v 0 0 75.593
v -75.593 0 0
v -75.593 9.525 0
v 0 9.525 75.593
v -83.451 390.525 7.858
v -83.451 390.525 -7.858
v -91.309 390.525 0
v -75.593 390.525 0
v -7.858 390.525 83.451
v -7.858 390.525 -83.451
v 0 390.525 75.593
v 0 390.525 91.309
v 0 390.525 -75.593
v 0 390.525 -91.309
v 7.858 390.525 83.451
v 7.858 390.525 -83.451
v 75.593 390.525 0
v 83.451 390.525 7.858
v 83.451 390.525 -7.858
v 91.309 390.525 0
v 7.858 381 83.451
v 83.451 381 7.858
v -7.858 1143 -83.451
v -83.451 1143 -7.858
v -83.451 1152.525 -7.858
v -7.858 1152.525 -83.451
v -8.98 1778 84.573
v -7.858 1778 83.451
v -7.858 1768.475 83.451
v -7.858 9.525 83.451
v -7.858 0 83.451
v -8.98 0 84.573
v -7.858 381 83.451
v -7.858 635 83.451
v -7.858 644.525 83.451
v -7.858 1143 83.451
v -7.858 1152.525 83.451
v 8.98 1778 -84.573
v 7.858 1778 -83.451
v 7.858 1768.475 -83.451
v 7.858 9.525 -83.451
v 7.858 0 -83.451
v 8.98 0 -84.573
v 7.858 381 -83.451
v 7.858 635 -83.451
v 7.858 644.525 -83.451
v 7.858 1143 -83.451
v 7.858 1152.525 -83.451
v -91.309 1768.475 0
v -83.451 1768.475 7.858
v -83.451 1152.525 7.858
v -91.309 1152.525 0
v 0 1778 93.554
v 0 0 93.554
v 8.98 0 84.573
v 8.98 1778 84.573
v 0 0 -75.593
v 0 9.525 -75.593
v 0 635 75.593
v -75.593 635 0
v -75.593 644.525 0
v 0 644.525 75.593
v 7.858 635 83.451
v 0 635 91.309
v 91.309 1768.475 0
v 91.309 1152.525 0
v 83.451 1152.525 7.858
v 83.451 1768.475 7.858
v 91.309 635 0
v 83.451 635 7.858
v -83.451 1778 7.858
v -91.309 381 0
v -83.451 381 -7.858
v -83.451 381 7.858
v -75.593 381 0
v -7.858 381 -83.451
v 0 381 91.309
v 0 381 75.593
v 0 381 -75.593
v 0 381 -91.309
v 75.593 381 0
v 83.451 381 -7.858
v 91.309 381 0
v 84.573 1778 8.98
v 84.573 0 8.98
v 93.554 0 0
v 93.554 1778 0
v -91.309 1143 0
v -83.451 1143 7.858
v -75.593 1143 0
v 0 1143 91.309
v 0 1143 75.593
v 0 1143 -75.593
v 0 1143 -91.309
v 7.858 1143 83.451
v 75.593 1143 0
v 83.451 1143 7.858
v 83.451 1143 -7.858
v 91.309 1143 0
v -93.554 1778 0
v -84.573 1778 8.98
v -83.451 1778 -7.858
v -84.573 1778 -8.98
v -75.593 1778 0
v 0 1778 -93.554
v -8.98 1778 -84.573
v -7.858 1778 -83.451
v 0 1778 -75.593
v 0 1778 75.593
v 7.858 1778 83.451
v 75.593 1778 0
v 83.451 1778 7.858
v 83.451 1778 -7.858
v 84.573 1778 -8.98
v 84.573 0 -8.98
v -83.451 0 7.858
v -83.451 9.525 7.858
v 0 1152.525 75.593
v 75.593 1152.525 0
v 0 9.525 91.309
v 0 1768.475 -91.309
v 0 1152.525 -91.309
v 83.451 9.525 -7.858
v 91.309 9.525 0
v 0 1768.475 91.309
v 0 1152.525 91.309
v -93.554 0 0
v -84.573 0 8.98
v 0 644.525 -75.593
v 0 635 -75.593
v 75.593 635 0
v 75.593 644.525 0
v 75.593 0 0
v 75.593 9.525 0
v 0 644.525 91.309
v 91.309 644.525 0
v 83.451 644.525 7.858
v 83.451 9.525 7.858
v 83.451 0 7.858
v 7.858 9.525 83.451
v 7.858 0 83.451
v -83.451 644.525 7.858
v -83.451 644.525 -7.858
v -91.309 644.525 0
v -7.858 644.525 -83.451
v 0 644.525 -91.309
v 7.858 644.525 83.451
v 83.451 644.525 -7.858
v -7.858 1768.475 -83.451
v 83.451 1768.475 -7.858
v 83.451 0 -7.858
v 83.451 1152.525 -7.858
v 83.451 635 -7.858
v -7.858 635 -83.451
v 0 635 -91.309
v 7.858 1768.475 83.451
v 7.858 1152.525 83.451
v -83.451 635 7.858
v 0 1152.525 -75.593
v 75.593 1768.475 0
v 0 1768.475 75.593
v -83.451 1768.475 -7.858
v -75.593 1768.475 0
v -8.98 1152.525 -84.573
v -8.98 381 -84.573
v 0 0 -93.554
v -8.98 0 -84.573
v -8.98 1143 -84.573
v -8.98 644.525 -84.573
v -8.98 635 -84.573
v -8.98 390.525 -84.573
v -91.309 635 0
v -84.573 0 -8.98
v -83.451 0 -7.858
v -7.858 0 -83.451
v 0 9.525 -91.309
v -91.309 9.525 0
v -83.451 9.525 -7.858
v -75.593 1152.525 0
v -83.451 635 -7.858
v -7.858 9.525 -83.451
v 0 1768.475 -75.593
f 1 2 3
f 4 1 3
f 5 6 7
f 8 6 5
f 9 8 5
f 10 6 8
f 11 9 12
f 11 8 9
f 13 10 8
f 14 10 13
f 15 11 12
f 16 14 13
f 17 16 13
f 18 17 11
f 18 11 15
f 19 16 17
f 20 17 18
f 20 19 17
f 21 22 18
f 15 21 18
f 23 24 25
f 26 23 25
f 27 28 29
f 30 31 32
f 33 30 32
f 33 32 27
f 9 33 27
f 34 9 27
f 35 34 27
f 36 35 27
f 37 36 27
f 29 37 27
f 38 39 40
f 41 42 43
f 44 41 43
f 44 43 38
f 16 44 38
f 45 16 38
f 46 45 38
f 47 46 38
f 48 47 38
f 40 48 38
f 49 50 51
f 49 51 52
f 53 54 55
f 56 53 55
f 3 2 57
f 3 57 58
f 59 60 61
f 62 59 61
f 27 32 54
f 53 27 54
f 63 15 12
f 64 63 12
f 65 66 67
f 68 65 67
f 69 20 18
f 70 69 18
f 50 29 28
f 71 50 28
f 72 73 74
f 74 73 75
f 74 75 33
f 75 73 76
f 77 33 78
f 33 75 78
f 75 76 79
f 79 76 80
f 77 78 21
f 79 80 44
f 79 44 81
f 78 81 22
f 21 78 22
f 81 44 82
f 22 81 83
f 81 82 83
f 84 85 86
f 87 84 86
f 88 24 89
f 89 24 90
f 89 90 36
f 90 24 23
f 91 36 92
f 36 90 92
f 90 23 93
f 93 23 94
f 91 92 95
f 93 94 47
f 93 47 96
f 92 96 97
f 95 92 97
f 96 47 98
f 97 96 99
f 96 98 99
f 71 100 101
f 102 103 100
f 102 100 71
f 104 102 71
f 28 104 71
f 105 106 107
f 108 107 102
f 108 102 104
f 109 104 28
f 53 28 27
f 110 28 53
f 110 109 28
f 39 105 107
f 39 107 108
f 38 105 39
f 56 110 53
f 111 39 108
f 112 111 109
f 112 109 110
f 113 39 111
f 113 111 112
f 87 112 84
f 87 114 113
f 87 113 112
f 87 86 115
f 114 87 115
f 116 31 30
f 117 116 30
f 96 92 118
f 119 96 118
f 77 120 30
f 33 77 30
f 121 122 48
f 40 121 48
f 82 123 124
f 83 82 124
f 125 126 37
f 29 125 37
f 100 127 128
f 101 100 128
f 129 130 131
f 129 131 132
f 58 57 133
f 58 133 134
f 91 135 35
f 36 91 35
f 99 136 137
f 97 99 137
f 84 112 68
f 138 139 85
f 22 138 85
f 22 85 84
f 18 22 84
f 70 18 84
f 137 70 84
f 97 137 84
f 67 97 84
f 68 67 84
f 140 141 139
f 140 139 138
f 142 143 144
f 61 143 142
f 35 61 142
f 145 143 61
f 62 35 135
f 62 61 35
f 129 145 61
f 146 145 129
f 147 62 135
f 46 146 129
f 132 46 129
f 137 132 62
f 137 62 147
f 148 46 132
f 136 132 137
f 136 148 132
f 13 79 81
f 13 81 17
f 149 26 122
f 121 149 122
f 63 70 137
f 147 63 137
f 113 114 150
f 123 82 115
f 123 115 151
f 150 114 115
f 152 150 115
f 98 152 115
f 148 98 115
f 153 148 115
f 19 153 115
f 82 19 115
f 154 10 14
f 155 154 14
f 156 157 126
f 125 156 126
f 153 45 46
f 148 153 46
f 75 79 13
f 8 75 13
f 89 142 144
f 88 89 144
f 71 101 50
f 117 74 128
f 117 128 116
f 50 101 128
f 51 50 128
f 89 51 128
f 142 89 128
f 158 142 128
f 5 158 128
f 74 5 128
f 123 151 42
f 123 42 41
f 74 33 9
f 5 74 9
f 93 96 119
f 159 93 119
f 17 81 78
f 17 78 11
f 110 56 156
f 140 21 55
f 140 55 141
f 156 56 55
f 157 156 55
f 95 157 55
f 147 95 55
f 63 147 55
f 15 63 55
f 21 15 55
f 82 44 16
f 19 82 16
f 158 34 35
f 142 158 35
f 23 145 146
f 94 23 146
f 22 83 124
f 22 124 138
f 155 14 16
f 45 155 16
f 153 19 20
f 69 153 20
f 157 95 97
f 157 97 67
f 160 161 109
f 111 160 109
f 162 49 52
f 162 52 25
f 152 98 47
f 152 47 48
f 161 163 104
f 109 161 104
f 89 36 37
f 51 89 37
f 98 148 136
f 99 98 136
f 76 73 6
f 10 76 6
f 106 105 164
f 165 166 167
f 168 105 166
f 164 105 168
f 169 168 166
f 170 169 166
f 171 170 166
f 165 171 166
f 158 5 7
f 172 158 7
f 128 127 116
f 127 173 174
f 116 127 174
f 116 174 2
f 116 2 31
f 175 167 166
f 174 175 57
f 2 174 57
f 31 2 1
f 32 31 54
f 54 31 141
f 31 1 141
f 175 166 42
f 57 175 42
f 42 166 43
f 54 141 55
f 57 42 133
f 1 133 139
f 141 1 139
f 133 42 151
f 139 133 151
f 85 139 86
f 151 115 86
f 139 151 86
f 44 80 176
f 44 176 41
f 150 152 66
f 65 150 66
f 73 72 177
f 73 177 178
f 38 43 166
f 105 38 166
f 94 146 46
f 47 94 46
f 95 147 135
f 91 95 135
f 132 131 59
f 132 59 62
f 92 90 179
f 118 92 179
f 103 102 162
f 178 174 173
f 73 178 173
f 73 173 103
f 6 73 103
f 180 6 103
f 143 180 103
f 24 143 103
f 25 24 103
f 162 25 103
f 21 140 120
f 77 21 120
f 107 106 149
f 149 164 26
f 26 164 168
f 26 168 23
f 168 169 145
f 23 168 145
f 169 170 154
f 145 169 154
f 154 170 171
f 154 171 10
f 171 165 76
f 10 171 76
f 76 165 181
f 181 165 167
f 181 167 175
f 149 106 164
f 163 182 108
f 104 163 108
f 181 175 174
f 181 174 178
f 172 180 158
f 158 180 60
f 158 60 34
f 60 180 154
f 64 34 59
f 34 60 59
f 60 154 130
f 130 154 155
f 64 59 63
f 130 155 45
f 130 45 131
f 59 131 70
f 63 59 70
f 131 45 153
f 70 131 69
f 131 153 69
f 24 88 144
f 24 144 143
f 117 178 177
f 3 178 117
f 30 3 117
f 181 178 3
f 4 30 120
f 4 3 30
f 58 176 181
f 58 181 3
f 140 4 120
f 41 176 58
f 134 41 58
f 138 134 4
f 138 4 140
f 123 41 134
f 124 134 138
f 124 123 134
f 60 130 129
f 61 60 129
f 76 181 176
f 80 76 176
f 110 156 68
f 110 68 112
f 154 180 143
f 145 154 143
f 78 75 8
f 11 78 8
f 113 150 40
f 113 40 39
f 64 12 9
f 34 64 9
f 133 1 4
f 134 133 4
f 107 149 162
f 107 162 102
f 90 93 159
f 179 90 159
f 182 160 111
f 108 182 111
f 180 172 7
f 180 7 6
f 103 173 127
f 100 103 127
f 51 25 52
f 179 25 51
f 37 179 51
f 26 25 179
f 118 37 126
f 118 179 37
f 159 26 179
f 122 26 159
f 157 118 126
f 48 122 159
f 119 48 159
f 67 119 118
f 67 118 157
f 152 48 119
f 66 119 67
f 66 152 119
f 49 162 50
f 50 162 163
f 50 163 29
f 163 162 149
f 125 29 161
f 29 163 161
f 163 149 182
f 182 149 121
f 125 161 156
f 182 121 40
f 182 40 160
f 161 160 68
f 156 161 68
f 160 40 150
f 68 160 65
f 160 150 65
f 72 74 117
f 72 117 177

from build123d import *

# Parameters (mm, degrees)
BOSS_EXTRUDE6_DEPTH   = 1778
BOSS_EXTRUDE6_2_DEPTH = 1778
BOSS_EXTRUDE6_3_DEPTH = 1778
BOSS_EXTRUDE6_4_DEPTH = 1778
SKETCH11_W            = 11.1125
SKETCH11_H            = 9.525
BOSS_EXTRUDE11_DEPTH  = 129.12986
SKETCH13_W            = 11.1125
SKETCH13_H            = 9.525
BOSS_EXTRUDE13_DEPTH  = 118.01736
SKETCH14_W            = 11.1125
SKETCH14_H            = 9.525
BOSS_EXTRUDE14_DEPTH  = 119.60486
SKETCH15_W            = 11.1125
SKETCH15_H            = 9.525
BOSS_EXTRUDE15_DEPTH  = 106.90486
LPATTERN1_COUNT       = 2
LPATTERN1_PITCH       = 381
LPATTERN2_COUNT       = 2
LPATTERN2_PITCH       = 635
LPATTERN3_COUNT       = 2
LPATTERN3_PITCH       = 1143
LPATTERN4_COUNT       = 2
LPATTERN4_PITCH       = 1768.475


with BuildPart() as part:
    # Sketch2 → Boss-Extrude6 (new body)
    with BuildSketch(Plane(origin=(0, 0, 0), x_dir=(1, 0, 0), z_dir=(0, 1, 0))):
        Polygon((0, 93.553663338), (-8.980256121, 84.573407217), (-7.857724106, 83.450875201), (0, 91.308599307), (7.857724106, 83.450875201), (8.980256121, 84.573407217), align=None)
    extrude(amount=BOSS_EXTRUDE6_DEPTH)



with BuildPart() as body_2:
    # Sketch2 → Boss-Extrude6 2 (new body)
    with BuildSketch(Plane(origin=(0, 0, 0), x_dir=(1, 0, 0), z_dir=(0, 1, 0))):
        Polygon((93.553663338, 0), (84.573407217, 8.980256121), (83.450875201, 7.857724106), (91.308599307, 0), (83.450875201, -7.857724106), (84.573407217, -8.980256121), align=None)
    extrude(amount=BOSS_EXTRUDE6_2_DEPTH)



with BuildPart() as body_3:
    # Sketch2 → Boss-Extrude6 3 (new body)
    with BuildSketch(Plane(origin=(0, 0, 0), x_dir=(1, 0, 0), z_dir=(0, 1, 0))):
        Polygon((0, -93.553663338), (8.980256121, -84.573407217), (7.857724106, -83.450875201), (0, -91.308599307), (-7.857724106, -83.450875201), (-8.980256121, -84.573407217), align=None)
    extrude(amount=BOSS_EXTRUDE6_3_DEPTH)



with BuildPart() as body_4:
    # Sketch2 → Boss-Extrude6 4 (new body)
    with BuildSketch(Plane(origin=(0, 0, 0), x_dir=(1, 0, 0), z_dir=(0, 1, 0))):
        Polygon((-93.553663338, 0), (-84.573407217, -8.980256121), (-83.450875201, -7.857724106), (-91.308599307, 0), (-83.450875201, 7.857724106), (-84.573407217, 8.980256121), align=None)
    extrude(amount=BOSS_EXTRUDE6_4_DEPTH)


with BuildPart() as body_3_1:
    add(body_3.part)

    add(body_4.part)  # Boss-Extrude11 merges body 4
    # Sketch11 → Boss-Extrude11 (add)
    with BuildSketch(Plane(origin=(-45.654299654, 0, -45.654299654), x_dir=(0.707106781, 0, -0.707106781), z_dir=(0.707106781, 0, 0.707106781))):
        with Locations((-59.008679751, 4.7625)):
            Rectangle(SKETCH11_W, SKETCH11_H)
    boss_extrude11 = extrude(amount=BOSS_EXTRUDE11_DEPTH)


with BuildPart() as body_2_1:
    add(body_2.part)

    add(body_3_1.part)  # Boss-Extrude13 merges body 3
    # Sketch13 → Boss-Extrude13 (add)
    with BuildSketch(Plane(origin=(-37.796575548, 0, 37.796575548), x_dir=(-0.707106781, 0, -0.707106781), z_dir=(0.707106781, 0, -0.707106781))):
        with Locations((-59.008679751, 4.7625)):
            Rectangle(SKETCH13_W, SKETCH13_H)
    boss_extrude13 = extrude(amount=BOSS_EXTRUDE13_DEPTH)


with BuildPart() as part_1:
    add(part.part)

    add(body_2_1.part)  # Boss-Extrude14 merges body 2
    # Sketch14 → Boss-Extrude14 (add)
    with BuildSketch(Plane(origin=(37.796575548, 0, 37.796575548), x_dir=(-0.707106781, 0, 0.707106781), z_dir=(-0.707106781, 0, -0.707106781))):
        with Locations((-59.008679751, 4.7625)):
            Rectangle(SKETCH14_W, SKETCH14_H)
    boss_extrude14 = extrude(amount=BOSS_EXTRUDE14_DEPTH)

    # Sketch15 → Boss-Extrude15 (add)
    with BuildSketch(Plane(origin=(37.796575548, 0, -37.796575548), x_dir=(0.707106781, 0, 0.707106781), z_dir=(-0.707106781, 0, 0.707106781))):
        with Locations((-59.008679751, 4.7625)):
            Rectangle(SKETCH15_W, SKETCH15_H)
    boss_extrude15 = extrude(amount=BOSS_EXTRUDE15_DEPTH)

    # LPattern1: Boss-Extrude11, Boss-Extrude13, Boss-Extrude14, Boss-Extrude15 ×2
    with Locations(*[(0, i * LPATTERN1_PITCH, 0) for i in range(1, LPATTERN1_COUNT)]):
        add(boss_extrude11)
        add(boss_extrude13)
        add(boss_extrude14)
        add(boss_extrude15)

    # LPattern2: Boss-Extrude11, Boss-Extrude13, Boss-Extrude14, Boss-Extrude15 ×2
    with Locations(*[(0, i * LPATTERN2_PITCH, 0) for i in range(1, LPATTERN2_COUNT)]):
        add(boss_extrude11)
        add(boss_extrude13)
        add(boss_extrude14)
        add(boss_extrude15)

    # LPattern3: Boss-Extrude11, Boss-Extrude13, Boss-Extrude14, Boss-Extrude15 ×2
    with Locations(*[(0, i * LPATTERN3_PITCH, 0) for i in range(1, LPATTERN3_COUNT)]):
        add(boss_extrude11)
        add(boss_extrude13)
        add(boss_extrude14)
        add(boss_extrude15)

    # LPattern4: Boss-Extrude11, Boss-Extrude13, Boss-Extrude14, Boss-Extrude15 ×2
    with Locations(*[(0, i * LPATTERN4_PITCH, 0) for i in range(1, LPATTERN4_COUNT)]):
        add(boss_extrude11)
        add(boss_extrude13)
        add(boss_extrude14)
        add(boss_extrude15)


solid = part_1.part
